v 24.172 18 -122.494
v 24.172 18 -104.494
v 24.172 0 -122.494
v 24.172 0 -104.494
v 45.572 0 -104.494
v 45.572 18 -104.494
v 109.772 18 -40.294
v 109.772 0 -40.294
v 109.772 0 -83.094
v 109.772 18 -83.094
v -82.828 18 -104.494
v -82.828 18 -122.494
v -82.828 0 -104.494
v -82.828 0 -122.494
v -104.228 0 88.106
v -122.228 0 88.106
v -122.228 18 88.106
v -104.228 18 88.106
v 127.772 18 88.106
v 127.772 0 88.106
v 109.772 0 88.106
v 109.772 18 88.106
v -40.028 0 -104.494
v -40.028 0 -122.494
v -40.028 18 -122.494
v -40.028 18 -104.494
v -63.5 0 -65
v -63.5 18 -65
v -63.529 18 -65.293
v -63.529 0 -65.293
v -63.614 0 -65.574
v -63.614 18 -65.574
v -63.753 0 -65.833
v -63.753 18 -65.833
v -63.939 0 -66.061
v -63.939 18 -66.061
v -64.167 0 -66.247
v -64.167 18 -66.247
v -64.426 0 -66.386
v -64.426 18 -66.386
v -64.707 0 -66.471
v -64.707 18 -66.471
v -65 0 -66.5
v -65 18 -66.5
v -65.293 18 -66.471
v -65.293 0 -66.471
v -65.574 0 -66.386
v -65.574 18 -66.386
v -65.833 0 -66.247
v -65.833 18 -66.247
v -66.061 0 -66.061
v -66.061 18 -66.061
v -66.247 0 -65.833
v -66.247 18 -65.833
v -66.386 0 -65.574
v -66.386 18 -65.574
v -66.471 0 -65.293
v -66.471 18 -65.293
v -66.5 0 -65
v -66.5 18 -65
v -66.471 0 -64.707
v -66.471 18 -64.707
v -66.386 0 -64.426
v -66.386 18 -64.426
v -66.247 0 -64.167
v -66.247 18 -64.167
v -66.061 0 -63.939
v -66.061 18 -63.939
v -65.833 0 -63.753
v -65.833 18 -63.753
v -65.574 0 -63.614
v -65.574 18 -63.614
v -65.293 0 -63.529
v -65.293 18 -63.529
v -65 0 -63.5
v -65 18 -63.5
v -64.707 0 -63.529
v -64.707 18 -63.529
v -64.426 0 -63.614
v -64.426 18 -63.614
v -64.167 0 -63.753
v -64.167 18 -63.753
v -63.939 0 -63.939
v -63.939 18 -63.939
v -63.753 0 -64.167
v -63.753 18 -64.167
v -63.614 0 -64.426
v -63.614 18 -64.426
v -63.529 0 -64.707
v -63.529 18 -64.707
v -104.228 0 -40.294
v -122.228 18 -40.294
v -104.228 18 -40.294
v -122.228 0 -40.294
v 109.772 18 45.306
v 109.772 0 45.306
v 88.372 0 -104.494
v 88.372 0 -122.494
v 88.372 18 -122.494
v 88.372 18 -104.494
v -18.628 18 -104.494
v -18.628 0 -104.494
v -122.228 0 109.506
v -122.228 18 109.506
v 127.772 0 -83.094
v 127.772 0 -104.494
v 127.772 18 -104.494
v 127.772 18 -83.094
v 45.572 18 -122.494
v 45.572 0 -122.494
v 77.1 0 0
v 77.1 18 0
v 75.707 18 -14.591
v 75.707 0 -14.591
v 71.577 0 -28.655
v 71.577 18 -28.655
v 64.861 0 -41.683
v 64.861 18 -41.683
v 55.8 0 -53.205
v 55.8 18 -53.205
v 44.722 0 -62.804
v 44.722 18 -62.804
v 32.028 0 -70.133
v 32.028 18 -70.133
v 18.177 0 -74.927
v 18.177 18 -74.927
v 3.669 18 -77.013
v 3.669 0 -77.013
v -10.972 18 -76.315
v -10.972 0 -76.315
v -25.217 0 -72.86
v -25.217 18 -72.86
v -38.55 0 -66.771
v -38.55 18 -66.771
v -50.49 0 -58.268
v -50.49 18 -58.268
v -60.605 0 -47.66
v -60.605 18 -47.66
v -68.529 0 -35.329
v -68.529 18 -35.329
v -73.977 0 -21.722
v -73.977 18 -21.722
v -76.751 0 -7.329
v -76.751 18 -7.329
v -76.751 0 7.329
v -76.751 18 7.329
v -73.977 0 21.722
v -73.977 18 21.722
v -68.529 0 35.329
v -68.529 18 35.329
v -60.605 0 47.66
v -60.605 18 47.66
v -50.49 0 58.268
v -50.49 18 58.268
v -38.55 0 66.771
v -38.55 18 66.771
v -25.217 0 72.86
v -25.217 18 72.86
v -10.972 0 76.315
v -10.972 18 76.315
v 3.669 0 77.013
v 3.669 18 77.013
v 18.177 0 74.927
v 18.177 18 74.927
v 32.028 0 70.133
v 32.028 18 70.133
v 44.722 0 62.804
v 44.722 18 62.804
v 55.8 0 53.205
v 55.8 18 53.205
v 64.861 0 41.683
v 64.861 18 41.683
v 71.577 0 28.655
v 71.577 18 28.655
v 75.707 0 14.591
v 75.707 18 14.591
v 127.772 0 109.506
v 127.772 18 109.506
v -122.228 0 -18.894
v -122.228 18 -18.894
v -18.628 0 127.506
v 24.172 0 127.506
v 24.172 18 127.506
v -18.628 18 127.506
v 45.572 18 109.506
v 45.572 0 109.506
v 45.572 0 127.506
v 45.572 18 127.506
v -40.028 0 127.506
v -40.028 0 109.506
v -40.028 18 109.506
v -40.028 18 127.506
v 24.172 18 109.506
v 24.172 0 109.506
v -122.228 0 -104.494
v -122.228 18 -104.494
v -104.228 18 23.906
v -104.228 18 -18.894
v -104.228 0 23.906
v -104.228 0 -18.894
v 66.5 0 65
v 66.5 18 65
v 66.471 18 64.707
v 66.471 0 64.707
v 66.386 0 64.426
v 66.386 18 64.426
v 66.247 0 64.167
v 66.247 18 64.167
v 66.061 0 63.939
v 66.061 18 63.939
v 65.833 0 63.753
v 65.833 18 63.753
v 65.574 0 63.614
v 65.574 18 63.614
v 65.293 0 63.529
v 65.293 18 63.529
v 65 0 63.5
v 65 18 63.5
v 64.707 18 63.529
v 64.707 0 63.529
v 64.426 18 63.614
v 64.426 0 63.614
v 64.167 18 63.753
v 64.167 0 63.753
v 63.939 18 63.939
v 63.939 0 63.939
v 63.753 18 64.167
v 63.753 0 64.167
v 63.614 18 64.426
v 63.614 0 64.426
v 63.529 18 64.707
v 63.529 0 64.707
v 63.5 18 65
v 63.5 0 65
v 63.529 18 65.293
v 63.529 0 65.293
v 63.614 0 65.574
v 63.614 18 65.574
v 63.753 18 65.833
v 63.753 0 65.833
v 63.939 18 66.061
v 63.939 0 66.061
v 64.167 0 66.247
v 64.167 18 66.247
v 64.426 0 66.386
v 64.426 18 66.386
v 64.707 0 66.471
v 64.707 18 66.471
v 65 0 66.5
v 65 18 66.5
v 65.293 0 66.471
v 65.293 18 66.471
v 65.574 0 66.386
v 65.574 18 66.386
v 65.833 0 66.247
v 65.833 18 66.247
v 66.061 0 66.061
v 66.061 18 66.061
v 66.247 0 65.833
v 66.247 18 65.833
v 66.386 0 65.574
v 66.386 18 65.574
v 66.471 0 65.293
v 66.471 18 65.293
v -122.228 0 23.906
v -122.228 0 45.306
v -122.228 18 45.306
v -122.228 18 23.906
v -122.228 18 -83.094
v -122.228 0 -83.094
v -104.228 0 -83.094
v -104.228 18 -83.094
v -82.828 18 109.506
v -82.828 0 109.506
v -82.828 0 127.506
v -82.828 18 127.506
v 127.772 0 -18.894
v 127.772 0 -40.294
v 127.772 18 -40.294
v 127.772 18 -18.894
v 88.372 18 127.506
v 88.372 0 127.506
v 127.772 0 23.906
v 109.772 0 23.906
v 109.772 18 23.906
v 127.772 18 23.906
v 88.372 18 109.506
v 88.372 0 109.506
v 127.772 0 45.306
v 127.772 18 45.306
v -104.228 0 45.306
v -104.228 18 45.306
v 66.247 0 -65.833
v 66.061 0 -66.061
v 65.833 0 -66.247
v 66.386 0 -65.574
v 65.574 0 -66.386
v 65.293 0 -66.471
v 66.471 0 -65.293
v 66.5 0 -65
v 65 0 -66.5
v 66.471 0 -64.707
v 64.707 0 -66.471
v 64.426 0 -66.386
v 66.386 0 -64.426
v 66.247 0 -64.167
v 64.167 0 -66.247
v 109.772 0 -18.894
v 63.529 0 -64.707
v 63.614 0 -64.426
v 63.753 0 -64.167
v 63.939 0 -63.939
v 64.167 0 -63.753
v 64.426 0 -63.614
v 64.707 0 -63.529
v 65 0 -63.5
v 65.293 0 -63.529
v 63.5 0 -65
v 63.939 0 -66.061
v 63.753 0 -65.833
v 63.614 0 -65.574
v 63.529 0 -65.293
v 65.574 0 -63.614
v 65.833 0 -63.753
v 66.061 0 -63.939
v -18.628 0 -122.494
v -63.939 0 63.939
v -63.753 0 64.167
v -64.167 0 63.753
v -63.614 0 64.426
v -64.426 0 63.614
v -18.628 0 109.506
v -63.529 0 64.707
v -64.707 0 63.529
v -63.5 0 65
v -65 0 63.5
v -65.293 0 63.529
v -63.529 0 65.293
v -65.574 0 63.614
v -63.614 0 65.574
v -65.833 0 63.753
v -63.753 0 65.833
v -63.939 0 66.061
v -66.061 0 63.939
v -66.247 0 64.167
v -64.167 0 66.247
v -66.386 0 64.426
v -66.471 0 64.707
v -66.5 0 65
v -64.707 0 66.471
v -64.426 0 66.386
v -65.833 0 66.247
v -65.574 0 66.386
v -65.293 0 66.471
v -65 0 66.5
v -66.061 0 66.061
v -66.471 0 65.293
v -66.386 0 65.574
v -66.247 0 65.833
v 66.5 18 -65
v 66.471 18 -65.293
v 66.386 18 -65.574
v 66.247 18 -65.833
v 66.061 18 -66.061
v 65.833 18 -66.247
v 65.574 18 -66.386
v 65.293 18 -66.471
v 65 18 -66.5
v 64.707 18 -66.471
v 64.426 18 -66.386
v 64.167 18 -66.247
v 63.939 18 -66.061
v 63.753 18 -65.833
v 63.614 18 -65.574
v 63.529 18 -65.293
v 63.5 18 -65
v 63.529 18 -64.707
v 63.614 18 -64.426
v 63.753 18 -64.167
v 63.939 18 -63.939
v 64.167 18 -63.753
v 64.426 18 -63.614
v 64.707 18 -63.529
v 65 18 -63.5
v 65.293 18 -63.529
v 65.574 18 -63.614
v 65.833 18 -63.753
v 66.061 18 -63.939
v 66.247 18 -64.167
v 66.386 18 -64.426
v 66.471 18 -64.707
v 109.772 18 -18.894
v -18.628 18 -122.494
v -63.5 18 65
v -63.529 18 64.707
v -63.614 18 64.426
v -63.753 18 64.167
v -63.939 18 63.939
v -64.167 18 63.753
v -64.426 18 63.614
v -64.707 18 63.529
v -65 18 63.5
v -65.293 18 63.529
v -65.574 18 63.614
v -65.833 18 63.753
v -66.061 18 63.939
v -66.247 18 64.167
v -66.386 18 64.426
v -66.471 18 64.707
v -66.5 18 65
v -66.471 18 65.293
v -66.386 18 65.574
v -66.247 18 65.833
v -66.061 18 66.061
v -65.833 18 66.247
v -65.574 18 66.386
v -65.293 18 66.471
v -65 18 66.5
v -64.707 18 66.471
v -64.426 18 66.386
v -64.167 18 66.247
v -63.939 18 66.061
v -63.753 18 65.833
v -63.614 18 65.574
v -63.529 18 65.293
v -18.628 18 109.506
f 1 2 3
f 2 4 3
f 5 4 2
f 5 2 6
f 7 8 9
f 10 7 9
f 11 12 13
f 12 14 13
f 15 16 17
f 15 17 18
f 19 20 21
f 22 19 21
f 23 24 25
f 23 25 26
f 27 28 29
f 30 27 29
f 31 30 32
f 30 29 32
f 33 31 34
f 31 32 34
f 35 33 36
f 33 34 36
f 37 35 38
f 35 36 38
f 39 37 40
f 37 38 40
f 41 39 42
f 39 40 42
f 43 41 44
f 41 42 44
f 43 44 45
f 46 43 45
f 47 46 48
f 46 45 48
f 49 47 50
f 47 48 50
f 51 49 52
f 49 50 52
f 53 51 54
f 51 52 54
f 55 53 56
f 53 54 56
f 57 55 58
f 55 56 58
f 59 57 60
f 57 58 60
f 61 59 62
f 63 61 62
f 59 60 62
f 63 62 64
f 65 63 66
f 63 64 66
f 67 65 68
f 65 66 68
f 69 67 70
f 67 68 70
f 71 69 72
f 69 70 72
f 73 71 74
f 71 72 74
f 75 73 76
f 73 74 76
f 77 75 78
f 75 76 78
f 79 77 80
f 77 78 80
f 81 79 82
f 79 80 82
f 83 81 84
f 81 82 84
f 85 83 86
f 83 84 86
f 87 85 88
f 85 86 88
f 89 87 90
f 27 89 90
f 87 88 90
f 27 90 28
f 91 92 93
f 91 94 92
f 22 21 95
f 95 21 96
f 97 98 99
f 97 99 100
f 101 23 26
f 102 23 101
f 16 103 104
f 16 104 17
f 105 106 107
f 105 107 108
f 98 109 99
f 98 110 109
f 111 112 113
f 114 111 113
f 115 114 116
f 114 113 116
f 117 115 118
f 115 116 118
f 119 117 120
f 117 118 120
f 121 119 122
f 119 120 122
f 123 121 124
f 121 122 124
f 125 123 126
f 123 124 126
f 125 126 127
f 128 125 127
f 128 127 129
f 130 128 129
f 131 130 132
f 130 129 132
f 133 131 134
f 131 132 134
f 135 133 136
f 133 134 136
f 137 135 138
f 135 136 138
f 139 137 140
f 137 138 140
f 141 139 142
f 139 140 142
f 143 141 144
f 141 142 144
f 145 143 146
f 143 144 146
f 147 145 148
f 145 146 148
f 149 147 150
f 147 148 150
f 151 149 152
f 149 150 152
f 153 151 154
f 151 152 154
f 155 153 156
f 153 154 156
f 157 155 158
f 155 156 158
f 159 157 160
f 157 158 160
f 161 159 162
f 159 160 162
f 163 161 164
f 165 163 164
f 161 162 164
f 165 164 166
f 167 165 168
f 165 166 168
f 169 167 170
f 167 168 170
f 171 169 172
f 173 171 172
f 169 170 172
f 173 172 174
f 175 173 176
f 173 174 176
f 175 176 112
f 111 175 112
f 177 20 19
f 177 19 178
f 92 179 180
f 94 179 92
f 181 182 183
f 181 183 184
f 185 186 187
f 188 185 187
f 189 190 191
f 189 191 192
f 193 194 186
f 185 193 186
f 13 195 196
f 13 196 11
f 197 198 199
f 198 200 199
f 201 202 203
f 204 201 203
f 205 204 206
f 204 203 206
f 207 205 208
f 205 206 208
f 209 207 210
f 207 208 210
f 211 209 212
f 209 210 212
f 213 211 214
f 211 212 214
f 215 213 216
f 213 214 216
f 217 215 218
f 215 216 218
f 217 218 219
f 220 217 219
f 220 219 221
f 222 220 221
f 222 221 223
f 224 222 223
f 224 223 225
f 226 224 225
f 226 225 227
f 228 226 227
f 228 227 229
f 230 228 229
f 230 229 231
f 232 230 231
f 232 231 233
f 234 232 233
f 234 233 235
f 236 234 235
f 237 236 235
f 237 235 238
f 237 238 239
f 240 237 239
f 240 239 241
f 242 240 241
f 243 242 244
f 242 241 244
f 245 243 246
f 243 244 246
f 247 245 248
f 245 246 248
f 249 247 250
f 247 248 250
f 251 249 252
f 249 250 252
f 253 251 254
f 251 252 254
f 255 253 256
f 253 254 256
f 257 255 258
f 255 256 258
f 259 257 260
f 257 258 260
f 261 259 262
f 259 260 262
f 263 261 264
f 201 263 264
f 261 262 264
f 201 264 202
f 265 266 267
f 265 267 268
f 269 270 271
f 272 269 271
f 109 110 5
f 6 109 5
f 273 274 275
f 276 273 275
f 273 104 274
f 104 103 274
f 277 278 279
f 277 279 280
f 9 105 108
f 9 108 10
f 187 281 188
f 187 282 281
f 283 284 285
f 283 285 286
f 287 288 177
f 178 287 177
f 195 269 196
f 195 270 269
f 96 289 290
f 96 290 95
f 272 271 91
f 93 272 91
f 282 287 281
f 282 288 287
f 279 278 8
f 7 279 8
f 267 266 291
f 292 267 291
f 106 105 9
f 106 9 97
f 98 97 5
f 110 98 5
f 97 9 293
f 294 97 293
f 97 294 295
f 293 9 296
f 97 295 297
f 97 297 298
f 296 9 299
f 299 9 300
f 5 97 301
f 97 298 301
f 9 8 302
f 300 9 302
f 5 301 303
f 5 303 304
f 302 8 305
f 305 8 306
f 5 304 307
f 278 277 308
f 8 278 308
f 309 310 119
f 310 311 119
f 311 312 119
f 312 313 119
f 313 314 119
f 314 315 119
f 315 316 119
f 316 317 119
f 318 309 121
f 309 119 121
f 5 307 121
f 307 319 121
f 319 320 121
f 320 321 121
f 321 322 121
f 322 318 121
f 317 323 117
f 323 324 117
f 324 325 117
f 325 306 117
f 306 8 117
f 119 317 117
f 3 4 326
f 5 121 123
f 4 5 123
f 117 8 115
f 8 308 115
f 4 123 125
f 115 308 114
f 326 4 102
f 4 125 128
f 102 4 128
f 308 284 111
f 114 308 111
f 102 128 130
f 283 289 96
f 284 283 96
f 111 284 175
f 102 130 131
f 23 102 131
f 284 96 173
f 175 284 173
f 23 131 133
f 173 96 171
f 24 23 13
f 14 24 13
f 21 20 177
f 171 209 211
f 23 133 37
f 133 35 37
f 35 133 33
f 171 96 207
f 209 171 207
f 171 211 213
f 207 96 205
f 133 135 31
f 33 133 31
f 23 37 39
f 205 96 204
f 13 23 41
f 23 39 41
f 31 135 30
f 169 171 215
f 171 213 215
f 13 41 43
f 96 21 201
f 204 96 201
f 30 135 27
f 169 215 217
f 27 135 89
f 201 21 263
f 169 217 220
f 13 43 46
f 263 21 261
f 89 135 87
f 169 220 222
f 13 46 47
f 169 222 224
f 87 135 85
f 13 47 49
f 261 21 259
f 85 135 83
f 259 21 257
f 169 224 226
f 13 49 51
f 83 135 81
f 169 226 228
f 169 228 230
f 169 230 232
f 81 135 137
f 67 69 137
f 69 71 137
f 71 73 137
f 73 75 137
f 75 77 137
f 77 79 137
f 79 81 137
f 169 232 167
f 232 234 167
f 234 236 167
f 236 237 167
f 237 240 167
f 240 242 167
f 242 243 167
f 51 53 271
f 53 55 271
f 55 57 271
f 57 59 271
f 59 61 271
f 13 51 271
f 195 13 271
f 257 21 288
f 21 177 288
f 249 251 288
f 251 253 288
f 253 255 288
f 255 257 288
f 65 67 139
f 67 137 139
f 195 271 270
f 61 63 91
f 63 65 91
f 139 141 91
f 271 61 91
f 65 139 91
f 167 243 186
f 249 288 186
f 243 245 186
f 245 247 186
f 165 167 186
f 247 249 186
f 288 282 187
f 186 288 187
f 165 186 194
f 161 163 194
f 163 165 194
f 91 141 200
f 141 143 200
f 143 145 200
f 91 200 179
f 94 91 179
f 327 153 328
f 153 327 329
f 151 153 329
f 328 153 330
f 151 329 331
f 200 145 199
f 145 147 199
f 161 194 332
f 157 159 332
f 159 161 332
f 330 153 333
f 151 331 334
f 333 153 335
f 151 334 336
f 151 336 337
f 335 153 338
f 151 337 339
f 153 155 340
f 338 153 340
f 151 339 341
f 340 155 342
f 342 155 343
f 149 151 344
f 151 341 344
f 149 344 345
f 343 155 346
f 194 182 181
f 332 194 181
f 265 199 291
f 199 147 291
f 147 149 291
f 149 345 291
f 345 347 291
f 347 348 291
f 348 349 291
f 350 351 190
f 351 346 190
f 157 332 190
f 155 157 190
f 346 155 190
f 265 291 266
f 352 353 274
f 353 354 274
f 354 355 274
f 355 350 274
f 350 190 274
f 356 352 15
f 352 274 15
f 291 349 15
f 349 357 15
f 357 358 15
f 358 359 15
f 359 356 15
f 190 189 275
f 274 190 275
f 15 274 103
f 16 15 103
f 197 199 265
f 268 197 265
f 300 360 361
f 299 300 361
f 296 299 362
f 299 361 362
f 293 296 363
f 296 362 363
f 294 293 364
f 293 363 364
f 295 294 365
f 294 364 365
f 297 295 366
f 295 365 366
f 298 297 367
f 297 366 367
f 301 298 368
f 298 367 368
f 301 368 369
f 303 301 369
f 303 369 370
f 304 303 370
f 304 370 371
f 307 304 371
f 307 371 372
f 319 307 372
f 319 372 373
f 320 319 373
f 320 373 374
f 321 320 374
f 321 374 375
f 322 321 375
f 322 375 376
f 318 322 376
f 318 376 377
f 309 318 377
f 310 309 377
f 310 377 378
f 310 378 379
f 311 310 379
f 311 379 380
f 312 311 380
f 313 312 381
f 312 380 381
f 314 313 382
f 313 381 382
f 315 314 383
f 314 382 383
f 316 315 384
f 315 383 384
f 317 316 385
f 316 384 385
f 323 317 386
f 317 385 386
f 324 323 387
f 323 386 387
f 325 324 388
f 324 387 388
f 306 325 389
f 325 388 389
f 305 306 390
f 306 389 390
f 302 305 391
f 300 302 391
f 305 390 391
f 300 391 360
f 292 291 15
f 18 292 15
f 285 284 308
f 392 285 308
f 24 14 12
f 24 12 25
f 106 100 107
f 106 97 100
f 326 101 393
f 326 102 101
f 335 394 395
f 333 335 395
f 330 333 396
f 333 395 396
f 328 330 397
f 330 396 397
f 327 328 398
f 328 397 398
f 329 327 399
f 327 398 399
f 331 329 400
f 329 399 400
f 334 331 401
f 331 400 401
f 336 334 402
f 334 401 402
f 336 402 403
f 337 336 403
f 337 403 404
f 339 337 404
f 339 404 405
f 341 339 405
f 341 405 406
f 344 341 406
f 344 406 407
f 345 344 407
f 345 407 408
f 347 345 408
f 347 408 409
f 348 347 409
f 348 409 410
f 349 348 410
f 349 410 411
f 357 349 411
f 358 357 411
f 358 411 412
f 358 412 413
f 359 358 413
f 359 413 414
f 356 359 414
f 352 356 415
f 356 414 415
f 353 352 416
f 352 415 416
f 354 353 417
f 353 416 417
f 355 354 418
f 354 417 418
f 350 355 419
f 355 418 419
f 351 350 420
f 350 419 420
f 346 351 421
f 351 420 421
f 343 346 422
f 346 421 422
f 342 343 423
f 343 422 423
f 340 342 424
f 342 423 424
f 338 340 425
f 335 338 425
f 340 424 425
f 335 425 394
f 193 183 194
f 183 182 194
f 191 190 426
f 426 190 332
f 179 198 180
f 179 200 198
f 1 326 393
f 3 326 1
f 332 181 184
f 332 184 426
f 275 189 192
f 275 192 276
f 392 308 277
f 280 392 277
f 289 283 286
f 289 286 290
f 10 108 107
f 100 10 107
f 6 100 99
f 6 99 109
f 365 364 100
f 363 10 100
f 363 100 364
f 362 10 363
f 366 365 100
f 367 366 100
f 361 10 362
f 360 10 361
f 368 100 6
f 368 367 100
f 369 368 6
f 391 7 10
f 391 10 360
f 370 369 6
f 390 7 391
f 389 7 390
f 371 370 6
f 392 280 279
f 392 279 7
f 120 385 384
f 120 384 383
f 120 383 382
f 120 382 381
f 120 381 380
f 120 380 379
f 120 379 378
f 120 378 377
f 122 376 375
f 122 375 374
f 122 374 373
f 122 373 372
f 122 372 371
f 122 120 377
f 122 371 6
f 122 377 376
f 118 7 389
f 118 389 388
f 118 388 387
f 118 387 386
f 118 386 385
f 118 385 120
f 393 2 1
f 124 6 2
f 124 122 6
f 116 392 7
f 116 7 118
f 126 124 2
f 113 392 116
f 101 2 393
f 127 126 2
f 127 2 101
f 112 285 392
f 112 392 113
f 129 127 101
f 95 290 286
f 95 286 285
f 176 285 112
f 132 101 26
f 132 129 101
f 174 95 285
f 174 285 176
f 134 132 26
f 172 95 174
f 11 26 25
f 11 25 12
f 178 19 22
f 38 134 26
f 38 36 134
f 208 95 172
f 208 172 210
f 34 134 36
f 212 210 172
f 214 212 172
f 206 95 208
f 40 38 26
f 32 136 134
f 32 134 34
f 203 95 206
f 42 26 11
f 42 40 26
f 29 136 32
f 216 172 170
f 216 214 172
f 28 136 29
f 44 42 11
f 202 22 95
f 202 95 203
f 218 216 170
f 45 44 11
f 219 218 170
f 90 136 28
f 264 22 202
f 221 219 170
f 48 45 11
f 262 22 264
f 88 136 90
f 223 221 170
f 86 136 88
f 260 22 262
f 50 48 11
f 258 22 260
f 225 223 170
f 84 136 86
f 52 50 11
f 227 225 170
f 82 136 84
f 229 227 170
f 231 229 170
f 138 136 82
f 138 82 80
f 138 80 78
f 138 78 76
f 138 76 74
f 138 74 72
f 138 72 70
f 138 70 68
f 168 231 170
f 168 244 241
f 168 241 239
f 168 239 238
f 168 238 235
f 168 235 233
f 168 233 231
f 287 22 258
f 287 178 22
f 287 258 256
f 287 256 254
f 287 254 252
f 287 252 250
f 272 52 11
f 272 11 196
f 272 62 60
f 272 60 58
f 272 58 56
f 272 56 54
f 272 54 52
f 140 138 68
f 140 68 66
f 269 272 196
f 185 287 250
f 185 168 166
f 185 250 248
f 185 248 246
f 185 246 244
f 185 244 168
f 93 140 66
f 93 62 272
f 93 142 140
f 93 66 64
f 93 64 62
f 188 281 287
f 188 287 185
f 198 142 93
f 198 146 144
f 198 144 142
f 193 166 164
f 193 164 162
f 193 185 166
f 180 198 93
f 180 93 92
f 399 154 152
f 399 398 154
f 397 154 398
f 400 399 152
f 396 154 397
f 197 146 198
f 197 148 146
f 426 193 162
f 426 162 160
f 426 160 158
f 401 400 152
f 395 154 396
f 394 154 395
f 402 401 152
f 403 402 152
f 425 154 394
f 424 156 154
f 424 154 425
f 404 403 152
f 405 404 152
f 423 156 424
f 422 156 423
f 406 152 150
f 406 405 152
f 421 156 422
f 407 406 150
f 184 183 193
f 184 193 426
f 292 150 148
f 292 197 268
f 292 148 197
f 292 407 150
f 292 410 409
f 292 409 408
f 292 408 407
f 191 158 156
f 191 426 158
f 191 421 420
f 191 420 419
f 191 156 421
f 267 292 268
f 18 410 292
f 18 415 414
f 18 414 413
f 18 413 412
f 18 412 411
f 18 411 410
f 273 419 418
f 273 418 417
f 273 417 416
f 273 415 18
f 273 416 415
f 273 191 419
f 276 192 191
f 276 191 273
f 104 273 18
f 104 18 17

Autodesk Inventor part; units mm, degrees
ref_plane "YZ Plane" through (0, 0, 0) normal (1, 0, 0) x (0, 1, 0)
ref_plane "XZ Plane" through (0, 0, 0) normal (0, 1, 0) x (-1, 0, 0)
ref_plane "XY Plane" through (0, 0, 0) normal (0, 0, 1) x (1, 0, 0)
sketch "Sketch1" plane through (0, 0, 0) normal (0, 1, 0) x (-1, 0, 0)
  line L0 (-127.7724, 127.5062) -> (122.2276, 127.5062)
  line L1 (122.2276, 127.5062) -> (122.2276, -122.4938)
  line L2 (122.2276, -122.4938) -> (-127.7724, -122.4938)
  line L3 (-127.7724, -122.4938) -> (-127.7724, 127.5062)
  line L4 (104.2276, -104.4938) -> (104.2276, 109.5062)
  line L5 (104.2276, -104.4938) -> (-109.7724, -104.4938)
  line L6 (-109.7724, -104.4938) -> (104.2276, -104.4938)
  line L7 (122.2276, 109.5062) -> (122.2276, 88.1062)
  line L8 (122.2276, 88.1062) -> (104.2276, 88.1062)
  line L9 (104.2276, 88.1062) -> (104.2276, 109.5062)
  line L10 (122.2276, 45.3062) -> (104.2276, 45.3062)
  line L11 (104.2276, 45.3062) -> (104.2276, 23.9062)
  line L12 (104.2276, 23.9062) -> (122.2276, 23.9062)
  line L13 (104.2276, -18.8938) -> (122.2276, -18.8938)
  line L14 (122.2276, -40.2938) -> (104.2276, -40.2938)
  line L15 (122.2276, -83.0938) -> (104.2276, -83.0938)
  line L16 (-127.7724, 127.5062) -> (-127.7724, 109.5062)
  line L17 (104.2276, 109.5062) -> (104.2276, 127.5062)
  line L18 (-127.7724, -83.0938) -> (-109.7724, -83.0938)
  line L19 (-127.7724, -40.2938) -> (-109.7724, -40.2938)
  line L20 (-109.7724, -18.8938) -> (-127.7724, -18.8938)
  line L21 (-109.7724, 23.9062) -> (-127.7724, 23.9062)
  line L22 (-127.7724, 45.3062) -> (-109.7724, 45.3062)
  line L23 (-127.7724, 88.1062) -> (-109.7724, 88.1062)
  line L24 (18.6276, -104.4938) -> (18.6276, -122.4938)
  line L25 (-24.1724, -104.4938) -> (-24.1724, -122.4938)
  line L26 (-45.5724, -122.4938) -> (-45.5724, -104.4938)
  line L27 (-88.3724, -122.4938) -> (-88.3724, -104.4938)
  line L28 (40.0276, -122.4938) -> (40.0276, -104.4938)
  line L29 (82.8276, -122.4938) -> (82.8276, -104.4938)
  line L30 (18.6276, 127.5062) -> (18.6276, 109.5062)
  line L31 (40.0276, 109.5062) -> (40.0276, 127.5062)
  line L32 (82.8276, 109.5062) -> (82.8276, 127.5062)
  line L33 (-45.5724, 109.5062) -> (-45.5724, 127.5062)
  line L34 (-88.3724, 109.5062) -> (-88.3724, 127.5062)
  line L35 (-24.1724, 127.5062) -> (-24.1724, 109.5062)
  line L36 (104.2276, 109.5062) -> (-109.7724, 109.5062)
  line L37 (-109.7724, 109.5062) -> (-109.7724, -104.4938)
  line L38 (-109.7724, 109.5062) -> (-127.7724, 109.5062)
  line L39 (-127.7724, 109.5062) -> (-127.7724, 127.5062)
  line L40 (-127.7724, 127.5062) -> (-109.7724, 127.5062)
  line L41 (-109.7724, 127.5062) -> (-109.7724, 109.5062)
  line L42 (-109.7724, -104.4938) -> (-127.7724, -104.4938)
  line L43 (-127.7724, -104.4938) -> (-127.7724, -122.4938)
  line L44 (-127.7724, -122.4938) -> (-109.7724, -122.4938)
  line L45 (-109.7724, -122.4938) -> (-109.7724, -104.4938)
  line L46 (104.2276, -104.4938) -> (122.2276, -104.4938)
  line L47 (122.2276, -104.4938) -> (122.2276, -122.4938)
  line L48 (122.2276, -122.4938) -> (104.2276, -122.4938)
  line L49 (104.2276, -122.4938) -> (104.2276, -104.4938)
  line L50 (104.2276, 109.5062) -> (122.2276, 109.5062)
  line L51 (122.2276, 109.5062) -> (122.2276, 127.5062)
  line L52 (122.2276, 127.5062) -> (104.2276, 127.5062)
  line L53 (104.2276, 127.5062) -> (104.2276, 109.5062)
  point P0 (0, 0)
  point P1 (-127.7724, -18.8938)
  point P2 (-109.7724, -104.4938)
  point P3 (-109.7724, -104.4938)
  dimension "d0" = 250
  dimension "d1" = 250
  dimension "d2" = 21.4
extrude "Plate1" add sketch "Sketch1" along normal blind 18 contours L38 L37 L23 L3 | L0 L33 L36 L34 | L36 L4 L5 L37 | L22 L37 L21 L3 | L0 L30 L36 L35 | L20 L37 L19 L3 | L0 L32 L36 L31 | L18 L37 L42 L3 | L50 L1 L8 L4 | L5 L26 L2 L27 | L10 L1 L12 L4 | L5 L24 L2 L25 | L13 L1 L14 L4 | L5 L29 L2 L28 | L15 L1 L46 L4
sketch "Sketch2" plane through (0, 18, 0) normal (0, 1, 0) x (1, 0, 0)
  circle A0 centre (0, 0) radius 77.1
  line L0 (-65, 65) -> (65, 65)
  line L1 (65, 65) -> (65, -65)
  line L2 (65, -65) -> (-65, -65)
  line L3 (-65, -65) -> (-65, 65)
  line L4 (-65, 65) -> (65, -65) construction
  line L5 (65, 65) -> (-65, -65) construction
  circle A1 centre (65, 65) radius 1.5
  circle A2 centre (65, -65) radius 1.5
  circle A3 centre (-65, -65) radius 1.5
  circle A4 centre (-65, 65) radius 1.5
  dimension "d4" = 154.2
  dimension "d5" = 130
  dimension "d6" = 130
  dimension "d7" = 3
  dimension "d8" = 3
  dimension "d9" = 3
  dimension "d10" = 3
extrude "Cut1" cut sketch "Sketch2" against normal blind 18 contours A0 L1 | L1 A0 L2 L3 L0 | L0 A0 | A1 L0 L1 | L1 L0 A1 | A0 L2 | A2 L2 L1 | L1 L2 A2 | L3 A0 | A4 L3 L0 | L0 L3 A4 | A3 L3 L2 | L2 L3 A3
equation "\"d11\" = Thickness"
equation "\"d3\" = Thickness"
equation "\"BendRadius\" = Thickness"
equation "\"BendReliefWidth\" = Thickness"
equation "\"BendReliefDepth\" = 0.5 * Thickness"
equation "\"CornerReliefSize\" = 4 * Thickness"
equation "\"MinimumRemnant\" = 2 * Thickness"
equation "\"TransitionRadius\" = BendRadius"
equation "\"JacobiRadiusSize\" = BendRadius"
equation "\"GapSize\" = Thickness"
equation "\"Thickness\" = 18"
properties part number "2"
